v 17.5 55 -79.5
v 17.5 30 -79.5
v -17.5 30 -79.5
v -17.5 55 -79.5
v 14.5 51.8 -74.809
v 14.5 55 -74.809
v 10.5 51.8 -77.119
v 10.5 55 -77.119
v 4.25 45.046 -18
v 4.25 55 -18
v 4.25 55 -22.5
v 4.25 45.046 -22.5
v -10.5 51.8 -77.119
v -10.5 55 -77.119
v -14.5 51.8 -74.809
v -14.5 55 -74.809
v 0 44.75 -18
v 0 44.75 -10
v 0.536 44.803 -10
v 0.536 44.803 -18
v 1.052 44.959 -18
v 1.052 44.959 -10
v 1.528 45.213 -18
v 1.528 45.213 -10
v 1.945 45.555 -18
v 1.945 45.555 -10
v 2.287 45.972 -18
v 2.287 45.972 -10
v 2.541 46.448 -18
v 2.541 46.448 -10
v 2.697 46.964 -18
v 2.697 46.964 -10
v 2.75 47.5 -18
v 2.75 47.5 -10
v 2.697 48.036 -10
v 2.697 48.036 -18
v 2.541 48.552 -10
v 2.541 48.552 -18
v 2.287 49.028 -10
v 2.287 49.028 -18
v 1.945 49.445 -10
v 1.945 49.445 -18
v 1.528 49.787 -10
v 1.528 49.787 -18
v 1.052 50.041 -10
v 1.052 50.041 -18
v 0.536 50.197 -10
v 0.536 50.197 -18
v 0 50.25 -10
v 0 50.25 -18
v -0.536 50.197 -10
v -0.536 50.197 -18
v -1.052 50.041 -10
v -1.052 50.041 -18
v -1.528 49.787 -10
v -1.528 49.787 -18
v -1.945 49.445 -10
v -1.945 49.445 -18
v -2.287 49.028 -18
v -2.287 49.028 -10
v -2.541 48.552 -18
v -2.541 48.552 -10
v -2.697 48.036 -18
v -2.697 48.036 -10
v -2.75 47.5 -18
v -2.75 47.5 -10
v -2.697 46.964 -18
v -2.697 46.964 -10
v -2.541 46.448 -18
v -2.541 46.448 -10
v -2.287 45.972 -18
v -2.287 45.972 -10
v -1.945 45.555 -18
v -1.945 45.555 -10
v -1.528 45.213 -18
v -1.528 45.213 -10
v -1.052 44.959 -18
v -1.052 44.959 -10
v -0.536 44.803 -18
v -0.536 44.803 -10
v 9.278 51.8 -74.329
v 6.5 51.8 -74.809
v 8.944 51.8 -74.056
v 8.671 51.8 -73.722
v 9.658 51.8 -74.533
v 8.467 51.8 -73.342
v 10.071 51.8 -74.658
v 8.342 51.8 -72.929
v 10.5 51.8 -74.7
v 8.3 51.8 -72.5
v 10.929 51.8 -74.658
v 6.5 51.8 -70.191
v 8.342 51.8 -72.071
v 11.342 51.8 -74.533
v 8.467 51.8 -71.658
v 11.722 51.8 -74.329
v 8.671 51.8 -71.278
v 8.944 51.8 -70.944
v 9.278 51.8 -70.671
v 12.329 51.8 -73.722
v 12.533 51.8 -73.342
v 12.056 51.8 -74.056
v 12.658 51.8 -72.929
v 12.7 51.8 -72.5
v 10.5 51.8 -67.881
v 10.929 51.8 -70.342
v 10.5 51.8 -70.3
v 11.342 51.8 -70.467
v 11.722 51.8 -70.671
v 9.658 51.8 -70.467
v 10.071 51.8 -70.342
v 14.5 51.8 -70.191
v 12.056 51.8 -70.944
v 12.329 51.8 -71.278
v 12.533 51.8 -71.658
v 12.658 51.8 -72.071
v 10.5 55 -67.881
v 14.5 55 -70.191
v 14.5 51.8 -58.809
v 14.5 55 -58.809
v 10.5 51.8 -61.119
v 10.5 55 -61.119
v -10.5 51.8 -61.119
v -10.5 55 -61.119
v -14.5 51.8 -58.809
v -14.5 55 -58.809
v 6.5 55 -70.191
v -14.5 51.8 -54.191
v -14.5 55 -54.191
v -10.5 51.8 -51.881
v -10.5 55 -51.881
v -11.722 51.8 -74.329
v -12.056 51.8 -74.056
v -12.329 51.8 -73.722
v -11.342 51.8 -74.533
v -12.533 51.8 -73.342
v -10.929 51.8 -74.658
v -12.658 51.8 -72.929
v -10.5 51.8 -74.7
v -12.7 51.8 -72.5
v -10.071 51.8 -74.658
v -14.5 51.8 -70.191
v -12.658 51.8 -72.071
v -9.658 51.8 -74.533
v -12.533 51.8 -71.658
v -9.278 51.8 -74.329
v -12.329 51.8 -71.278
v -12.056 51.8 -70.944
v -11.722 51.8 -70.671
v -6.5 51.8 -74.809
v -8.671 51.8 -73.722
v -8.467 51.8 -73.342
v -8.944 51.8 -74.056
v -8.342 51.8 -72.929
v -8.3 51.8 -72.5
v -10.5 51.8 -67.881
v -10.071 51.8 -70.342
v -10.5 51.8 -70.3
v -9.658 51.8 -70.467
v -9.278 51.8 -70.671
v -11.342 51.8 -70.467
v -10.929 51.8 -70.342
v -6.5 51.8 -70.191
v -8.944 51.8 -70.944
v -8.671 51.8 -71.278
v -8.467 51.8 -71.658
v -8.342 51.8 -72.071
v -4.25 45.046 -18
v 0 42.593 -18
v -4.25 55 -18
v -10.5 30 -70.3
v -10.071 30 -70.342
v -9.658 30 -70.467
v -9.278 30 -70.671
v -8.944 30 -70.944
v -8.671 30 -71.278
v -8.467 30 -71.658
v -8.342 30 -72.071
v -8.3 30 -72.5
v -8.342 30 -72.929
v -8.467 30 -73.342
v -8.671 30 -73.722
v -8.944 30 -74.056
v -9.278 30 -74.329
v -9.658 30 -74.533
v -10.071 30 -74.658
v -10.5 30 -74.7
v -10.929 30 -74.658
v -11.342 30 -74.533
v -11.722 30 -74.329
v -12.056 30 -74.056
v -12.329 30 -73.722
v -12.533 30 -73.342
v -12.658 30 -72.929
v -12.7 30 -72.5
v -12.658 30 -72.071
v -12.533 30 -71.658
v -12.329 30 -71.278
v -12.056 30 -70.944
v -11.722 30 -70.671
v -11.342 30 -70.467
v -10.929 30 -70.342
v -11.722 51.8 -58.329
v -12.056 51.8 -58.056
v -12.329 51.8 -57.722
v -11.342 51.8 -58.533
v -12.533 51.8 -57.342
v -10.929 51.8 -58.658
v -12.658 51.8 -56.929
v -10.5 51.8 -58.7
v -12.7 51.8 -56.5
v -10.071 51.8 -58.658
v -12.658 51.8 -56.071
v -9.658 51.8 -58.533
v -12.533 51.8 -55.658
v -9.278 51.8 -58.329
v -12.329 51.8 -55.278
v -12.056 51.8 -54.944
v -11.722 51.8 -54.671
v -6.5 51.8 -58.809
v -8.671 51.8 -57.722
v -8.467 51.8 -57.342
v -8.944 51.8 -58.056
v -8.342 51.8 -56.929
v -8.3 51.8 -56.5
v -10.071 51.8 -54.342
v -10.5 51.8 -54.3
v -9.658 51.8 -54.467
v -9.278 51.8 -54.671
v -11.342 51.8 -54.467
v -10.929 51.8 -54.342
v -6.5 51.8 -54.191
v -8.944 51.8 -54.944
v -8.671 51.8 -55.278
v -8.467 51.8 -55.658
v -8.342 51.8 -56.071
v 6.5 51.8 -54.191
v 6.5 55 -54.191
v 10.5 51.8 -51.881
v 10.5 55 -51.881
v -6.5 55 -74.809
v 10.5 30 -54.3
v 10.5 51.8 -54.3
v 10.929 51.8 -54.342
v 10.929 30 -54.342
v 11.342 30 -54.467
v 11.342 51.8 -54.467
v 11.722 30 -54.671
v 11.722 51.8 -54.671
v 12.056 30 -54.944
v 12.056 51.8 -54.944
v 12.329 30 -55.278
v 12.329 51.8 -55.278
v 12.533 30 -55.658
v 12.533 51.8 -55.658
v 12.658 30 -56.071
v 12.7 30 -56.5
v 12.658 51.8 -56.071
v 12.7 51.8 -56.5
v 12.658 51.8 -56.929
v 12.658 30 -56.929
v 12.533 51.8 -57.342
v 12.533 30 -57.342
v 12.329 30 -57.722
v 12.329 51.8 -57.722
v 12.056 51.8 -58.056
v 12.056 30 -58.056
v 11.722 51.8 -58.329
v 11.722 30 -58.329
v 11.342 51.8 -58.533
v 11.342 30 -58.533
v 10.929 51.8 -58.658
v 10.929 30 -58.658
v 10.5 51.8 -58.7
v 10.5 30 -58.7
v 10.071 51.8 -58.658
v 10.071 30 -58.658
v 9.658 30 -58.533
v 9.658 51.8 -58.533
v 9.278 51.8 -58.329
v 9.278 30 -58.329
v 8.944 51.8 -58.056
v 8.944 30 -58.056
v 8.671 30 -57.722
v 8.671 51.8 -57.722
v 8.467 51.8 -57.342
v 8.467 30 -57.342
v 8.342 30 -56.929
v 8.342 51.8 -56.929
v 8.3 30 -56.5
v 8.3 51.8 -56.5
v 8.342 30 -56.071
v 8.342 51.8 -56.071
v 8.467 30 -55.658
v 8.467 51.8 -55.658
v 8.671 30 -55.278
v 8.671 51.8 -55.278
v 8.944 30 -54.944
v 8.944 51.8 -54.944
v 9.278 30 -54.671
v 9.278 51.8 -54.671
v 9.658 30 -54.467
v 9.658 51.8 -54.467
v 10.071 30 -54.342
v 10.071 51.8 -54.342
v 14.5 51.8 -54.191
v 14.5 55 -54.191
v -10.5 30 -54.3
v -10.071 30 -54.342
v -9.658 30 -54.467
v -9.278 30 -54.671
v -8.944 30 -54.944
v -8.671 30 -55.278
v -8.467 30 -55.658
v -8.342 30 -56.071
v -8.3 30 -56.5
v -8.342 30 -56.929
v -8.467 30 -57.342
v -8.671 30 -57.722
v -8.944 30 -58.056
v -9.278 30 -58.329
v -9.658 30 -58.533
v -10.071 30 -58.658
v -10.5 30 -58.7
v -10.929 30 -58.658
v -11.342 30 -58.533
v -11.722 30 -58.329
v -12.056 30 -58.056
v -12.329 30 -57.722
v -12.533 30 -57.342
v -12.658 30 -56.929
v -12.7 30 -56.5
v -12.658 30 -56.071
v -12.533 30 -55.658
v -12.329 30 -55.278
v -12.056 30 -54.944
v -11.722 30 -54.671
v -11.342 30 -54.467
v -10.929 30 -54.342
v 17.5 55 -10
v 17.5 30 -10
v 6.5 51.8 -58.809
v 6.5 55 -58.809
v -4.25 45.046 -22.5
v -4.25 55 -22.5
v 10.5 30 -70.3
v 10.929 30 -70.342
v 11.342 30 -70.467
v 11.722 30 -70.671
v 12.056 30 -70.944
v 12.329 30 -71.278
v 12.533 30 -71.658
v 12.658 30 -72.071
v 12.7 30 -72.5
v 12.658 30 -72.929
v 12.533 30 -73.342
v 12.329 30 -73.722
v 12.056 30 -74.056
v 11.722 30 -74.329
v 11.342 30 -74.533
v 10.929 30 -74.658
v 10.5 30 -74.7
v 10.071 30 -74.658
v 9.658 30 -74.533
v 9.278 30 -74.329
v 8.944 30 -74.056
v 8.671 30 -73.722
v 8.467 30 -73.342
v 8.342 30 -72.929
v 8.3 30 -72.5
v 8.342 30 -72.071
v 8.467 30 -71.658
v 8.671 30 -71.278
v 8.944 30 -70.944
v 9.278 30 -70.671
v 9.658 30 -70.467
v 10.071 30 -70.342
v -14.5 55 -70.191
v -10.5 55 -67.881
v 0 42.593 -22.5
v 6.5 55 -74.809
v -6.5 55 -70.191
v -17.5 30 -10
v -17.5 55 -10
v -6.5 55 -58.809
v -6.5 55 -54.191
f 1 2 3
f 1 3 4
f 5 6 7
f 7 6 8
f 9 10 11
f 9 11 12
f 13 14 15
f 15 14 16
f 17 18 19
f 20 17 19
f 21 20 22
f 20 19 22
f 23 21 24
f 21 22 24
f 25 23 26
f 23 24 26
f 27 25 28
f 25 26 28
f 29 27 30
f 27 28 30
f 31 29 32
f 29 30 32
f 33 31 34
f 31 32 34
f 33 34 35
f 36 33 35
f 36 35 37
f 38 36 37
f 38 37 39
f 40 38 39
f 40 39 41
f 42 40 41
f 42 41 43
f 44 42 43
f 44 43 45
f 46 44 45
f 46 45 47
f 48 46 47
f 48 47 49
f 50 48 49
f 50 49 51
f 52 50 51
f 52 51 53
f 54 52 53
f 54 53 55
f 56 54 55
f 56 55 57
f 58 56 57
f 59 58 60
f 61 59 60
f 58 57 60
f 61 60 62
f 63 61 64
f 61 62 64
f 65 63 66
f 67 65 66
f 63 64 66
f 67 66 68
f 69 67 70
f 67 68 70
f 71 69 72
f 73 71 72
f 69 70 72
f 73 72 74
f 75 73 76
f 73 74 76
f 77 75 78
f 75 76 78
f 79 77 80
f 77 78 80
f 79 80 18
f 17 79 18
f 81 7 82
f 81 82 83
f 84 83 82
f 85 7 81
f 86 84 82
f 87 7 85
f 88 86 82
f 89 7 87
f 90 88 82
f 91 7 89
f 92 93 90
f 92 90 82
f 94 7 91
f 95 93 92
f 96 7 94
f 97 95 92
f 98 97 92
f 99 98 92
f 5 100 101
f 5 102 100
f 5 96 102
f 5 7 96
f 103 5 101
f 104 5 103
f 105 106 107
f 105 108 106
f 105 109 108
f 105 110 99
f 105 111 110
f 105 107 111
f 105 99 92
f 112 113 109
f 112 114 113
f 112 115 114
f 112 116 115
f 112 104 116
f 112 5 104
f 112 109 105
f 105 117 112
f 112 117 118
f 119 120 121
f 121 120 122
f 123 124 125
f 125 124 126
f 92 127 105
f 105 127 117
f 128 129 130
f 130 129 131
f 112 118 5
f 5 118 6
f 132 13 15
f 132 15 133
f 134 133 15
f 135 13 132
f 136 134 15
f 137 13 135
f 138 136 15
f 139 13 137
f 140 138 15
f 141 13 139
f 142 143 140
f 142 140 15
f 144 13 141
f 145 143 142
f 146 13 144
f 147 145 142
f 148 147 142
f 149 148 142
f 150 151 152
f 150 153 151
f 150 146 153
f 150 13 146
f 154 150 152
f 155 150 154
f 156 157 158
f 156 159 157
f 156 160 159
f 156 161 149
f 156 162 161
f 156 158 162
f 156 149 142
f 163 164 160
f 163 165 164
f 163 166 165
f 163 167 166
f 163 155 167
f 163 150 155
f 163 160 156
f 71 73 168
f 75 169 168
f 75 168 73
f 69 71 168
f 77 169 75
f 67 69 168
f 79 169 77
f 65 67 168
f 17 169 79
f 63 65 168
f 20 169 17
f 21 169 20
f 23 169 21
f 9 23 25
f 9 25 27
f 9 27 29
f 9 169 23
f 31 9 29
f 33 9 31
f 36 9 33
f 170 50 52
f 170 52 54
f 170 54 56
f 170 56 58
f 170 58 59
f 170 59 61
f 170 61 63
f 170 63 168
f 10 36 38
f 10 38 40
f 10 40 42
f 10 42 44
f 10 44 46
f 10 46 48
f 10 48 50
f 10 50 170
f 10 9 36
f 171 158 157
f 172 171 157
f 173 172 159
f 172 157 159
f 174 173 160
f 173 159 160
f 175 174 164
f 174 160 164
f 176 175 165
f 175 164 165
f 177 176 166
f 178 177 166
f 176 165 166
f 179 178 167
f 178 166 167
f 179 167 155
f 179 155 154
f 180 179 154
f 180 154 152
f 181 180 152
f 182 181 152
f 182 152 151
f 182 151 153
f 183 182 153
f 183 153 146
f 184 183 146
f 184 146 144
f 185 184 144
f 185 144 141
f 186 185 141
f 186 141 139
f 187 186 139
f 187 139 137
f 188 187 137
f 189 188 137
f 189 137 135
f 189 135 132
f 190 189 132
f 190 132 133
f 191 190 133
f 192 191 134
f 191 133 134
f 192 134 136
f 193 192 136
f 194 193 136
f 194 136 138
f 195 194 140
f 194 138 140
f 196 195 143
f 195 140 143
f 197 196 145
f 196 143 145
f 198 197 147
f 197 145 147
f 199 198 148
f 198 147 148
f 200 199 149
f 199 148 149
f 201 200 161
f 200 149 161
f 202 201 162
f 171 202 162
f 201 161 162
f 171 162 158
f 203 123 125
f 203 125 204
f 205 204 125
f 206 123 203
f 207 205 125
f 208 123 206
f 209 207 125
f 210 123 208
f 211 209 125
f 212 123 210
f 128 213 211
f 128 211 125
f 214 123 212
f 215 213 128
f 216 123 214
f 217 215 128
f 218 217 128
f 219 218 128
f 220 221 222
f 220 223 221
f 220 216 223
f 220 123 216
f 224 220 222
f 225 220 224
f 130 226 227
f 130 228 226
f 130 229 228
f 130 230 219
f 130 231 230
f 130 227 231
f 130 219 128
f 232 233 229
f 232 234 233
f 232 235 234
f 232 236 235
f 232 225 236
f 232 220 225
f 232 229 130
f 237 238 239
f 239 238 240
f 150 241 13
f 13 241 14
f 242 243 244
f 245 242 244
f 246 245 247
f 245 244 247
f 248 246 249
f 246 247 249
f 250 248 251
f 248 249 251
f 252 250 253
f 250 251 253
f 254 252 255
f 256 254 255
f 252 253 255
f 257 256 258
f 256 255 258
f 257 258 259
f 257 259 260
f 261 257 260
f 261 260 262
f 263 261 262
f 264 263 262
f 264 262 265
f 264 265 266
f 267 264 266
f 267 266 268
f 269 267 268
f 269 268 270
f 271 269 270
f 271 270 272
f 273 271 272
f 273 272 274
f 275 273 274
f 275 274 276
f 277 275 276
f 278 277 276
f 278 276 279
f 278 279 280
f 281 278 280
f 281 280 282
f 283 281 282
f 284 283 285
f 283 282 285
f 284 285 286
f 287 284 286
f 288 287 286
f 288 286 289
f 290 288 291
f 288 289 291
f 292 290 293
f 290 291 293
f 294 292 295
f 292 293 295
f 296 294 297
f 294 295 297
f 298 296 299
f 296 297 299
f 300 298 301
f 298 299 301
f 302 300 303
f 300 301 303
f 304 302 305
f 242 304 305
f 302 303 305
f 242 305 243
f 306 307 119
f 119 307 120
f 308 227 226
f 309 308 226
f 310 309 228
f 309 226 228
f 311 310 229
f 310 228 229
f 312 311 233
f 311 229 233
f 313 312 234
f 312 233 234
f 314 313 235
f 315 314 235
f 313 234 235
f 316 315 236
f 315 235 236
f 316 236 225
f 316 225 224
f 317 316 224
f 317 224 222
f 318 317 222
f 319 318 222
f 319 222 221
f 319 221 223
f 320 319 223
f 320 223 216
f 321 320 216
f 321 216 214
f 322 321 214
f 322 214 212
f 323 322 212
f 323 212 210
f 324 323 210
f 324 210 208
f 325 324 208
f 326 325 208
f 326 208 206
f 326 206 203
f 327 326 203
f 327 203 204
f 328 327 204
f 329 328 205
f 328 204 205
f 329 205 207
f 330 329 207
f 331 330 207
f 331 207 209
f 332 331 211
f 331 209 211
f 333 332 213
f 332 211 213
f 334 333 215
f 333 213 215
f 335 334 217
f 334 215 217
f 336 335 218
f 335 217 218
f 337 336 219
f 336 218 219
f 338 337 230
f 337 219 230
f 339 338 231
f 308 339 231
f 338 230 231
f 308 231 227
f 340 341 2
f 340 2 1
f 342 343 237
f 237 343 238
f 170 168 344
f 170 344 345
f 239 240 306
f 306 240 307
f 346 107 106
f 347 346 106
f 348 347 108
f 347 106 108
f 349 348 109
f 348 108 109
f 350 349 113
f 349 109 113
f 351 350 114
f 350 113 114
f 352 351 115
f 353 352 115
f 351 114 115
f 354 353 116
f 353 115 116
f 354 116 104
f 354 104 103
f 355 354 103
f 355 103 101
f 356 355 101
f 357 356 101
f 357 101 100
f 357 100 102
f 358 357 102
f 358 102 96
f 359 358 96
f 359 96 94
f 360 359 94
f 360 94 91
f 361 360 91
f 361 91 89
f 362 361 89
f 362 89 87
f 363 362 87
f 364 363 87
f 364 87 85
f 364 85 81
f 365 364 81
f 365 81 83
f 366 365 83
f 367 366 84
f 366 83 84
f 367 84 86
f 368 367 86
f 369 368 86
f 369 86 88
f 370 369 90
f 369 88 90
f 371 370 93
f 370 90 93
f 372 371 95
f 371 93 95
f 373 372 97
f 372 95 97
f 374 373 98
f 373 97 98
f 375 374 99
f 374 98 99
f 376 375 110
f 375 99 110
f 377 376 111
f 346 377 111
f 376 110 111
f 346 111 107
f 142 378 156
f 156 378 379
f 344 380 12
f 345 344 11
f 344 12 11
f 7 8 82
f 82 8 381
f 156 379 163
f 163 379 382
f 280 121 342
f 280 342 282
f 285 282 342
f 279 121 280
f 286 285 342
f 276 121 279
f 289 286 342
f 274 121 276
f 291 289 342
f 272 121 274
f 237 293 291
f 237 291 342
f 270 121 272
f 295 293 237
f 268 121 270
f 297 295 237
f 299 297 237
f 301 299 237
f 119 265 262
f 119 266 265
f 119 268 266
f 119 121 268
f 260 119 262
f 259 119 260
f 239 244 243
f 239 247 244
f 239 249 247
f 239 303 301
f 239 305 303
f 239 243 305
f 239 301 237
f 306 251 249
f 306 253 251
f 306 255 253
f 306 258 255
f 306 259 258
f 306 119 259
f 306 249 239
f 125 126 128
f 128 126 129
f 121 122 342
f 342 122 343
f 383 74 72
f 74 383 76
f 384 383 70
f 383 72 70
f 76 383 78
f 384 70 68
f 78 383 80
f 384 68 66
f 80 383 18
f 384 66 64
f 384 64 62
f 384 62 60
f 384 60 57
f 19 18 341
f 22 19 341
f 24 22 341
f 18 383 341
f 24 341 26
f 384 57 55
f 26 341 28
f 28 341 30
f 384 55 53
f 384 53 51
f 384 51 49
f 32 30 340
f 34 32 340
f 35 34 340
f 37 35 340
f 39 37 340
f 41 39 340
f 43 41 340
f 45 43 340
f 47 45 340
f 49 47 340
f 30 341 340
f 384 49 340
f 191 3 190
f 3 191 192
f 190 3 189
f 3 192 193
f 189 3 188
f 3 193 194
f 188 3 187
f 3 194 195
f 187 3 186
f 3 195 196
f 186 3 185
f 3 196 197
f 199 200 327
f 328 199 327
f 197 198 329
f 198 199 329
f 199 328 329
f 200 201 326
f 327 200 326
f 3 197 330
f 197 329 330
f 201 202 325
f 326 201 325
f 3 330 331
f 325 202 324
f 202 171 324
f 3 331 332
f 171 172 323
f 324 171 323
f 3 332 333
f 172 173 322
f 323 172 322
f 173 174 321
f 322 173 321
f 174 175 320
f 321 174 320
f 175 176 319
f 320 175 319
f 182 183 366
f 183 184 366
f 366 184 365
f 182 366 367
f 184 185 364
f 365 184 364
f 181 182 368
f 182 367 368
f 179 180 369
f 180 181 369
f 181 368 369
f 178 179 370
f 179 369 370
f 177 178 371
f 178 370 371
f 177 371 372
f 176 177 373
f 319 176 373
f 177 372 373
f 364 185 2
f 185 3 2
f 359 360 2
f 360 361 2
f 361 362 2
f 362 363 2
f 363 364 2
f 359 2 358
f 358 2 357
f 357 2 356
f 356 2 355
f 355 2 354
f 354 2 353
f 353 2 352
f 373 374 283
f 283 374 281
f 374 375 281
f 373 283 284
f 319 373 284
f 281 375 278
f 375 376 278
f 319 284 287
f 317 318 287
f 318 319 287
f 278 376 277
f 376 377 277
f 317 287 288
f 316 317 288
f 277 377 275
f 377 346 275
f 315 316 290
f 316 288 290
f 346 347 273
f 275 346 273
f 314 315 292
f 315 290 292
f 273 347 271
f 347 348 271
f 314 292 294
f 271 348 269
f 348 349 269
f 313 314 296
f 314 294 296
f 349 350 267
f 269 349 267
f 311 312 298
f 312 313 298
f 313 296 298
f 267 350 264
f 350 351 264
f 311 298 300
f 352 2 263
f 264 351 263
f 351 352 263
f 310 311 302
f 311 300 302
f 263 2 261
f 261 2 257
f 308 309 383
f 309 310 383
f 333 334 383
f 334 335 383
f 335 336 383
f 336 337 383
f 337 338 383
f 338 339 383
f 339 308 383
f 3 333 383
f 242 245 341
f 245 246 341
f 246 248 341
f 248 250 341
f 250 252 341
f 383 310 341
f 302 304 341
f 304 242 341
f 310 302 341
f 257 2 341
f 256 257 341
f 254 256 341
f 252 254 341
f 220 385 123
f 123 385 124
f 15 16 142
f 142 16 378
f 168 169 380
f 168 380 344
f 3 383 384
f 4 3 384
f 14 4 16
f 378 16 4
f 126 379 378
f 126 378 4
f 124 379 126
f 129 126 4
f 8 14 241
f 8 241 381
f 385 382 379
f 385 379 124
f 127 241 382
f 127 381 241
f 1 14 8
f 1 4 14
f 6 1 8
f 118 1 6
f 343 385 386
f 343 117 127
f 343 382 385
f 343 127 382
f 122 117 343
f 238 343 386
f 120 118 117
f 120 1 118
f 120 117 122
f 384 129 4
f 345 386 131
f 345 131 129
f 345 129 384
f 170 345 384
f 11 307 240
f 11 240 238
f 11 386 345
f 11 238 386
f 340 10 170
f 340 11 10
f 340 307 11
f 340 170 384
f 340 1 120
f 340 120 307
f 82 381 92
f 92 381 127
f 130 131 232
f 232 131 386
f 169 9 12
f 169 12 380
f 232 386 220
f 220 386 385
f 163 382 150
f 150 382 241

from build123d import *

# Parameters (mm, degrees)
SKETCH_W        = 25
SKETCH_H        = 69.5
PAD_DEPTH       = 17.5
POCKET_DEPTH    = 4.5
SKETCH003_R     = 2.75
HOLE001_DEPTH   = 12
SKETCH004_R     = 2.2
HOLE_DEPTH      = 25.001
POCKET001_DEPTH = 3.2


with BuildPart() as part:
    # Sketch → Pad (new body, symmetric)
    with BuildSketch(Plane.YZ):
        with Locations((42.5, -44.75)):
            Rectangle(SKETCH_W, SKETCH_H)
    extrude(amount=PAD_DEPTH, both=True)

    # Sketch002 → Pocket (cut)
    with BuildSketch(Plane(origin=(0, 0, -18), x_dir=(0, -1, 0), z_dir=(0, 0, 1))):
        Polygon((-55, -4.25), (-55, 4.25), (-45.046262, 4.25), (-42.592523, 0), (-45.046262, -4.25), align=None)
    extrude(amount=-POCKET_DEPTH, mode=Mode.SUBTRACT)

    # Sketch003 (on Face2 of Pocket) → Hole001 (cut)
    with BuildSketch(Plane(origin=(0, 0, -10), x_dir=(0, -1, 0), z_dir=(0, 0, 1))):
        with Locations((-47.5, 0)):
            Circle(SKETCH003_R)
    extrude(amount=-HOLE001_DEPTH, mode=Mode.SUBTRACT)

    # Sketch004 (on Face6 of Hole001) → Hole (cut, through all)
    with BuildSketch(Plane.ZX.offset(55)):
        with Locations((-72.5, 10.5)):
            Circle(SKETCH004_R)
        with Locations((-56.5, 10.5)):
            Circle(SKETCH004_R)
        with Locations((-72.5, -10.5)):
            Circle(SKETCH004_R)
        with Locations((-56.5, -10.5)):
            Circle(SKETCH004_R)
    extrude(amount=-HOLE_DEPTH, mode=Mode.SUBTRACT)

    # Sketch005 (on Face10 of Hole) → Pocket001 (cut)
    with BuildSketch(Plane.ZX.offset(55)):
        Polygon((-70.190599, 14.5), (-74.809401, 14.5), (-77.118802, 10.5), (-74.809401, 6.5), (-70.190599, 6.5), (-67.881198, 10.5), align=None)
        Polygon((-51.881198, 10.5), (-54.190599, 14.5), (-58.809401, 14.5), (-61.118802, 10.5), (-58.809401, 6.5), (-54.190599, 6.5), align=None)
        Polygon((-51.881198, -10.5), (-54.190599, -6.5), (-58.809401, -6.5), (-61.118802, -10.5), (-58.809401, -14.5), (-54.190599, -14.5), align=None)
        Polygon((-70.190599, -6.5), (-74.809401, -6.5), (-77.118802, -10.5), (-74.809401, -14.5), (-70.190599, -14.5), (-67.881198, -10.5), align=None)
    extrude(amount=-POCKET001_DEPTH, mode=Mode.SUBTRACT)


solid = part.part
